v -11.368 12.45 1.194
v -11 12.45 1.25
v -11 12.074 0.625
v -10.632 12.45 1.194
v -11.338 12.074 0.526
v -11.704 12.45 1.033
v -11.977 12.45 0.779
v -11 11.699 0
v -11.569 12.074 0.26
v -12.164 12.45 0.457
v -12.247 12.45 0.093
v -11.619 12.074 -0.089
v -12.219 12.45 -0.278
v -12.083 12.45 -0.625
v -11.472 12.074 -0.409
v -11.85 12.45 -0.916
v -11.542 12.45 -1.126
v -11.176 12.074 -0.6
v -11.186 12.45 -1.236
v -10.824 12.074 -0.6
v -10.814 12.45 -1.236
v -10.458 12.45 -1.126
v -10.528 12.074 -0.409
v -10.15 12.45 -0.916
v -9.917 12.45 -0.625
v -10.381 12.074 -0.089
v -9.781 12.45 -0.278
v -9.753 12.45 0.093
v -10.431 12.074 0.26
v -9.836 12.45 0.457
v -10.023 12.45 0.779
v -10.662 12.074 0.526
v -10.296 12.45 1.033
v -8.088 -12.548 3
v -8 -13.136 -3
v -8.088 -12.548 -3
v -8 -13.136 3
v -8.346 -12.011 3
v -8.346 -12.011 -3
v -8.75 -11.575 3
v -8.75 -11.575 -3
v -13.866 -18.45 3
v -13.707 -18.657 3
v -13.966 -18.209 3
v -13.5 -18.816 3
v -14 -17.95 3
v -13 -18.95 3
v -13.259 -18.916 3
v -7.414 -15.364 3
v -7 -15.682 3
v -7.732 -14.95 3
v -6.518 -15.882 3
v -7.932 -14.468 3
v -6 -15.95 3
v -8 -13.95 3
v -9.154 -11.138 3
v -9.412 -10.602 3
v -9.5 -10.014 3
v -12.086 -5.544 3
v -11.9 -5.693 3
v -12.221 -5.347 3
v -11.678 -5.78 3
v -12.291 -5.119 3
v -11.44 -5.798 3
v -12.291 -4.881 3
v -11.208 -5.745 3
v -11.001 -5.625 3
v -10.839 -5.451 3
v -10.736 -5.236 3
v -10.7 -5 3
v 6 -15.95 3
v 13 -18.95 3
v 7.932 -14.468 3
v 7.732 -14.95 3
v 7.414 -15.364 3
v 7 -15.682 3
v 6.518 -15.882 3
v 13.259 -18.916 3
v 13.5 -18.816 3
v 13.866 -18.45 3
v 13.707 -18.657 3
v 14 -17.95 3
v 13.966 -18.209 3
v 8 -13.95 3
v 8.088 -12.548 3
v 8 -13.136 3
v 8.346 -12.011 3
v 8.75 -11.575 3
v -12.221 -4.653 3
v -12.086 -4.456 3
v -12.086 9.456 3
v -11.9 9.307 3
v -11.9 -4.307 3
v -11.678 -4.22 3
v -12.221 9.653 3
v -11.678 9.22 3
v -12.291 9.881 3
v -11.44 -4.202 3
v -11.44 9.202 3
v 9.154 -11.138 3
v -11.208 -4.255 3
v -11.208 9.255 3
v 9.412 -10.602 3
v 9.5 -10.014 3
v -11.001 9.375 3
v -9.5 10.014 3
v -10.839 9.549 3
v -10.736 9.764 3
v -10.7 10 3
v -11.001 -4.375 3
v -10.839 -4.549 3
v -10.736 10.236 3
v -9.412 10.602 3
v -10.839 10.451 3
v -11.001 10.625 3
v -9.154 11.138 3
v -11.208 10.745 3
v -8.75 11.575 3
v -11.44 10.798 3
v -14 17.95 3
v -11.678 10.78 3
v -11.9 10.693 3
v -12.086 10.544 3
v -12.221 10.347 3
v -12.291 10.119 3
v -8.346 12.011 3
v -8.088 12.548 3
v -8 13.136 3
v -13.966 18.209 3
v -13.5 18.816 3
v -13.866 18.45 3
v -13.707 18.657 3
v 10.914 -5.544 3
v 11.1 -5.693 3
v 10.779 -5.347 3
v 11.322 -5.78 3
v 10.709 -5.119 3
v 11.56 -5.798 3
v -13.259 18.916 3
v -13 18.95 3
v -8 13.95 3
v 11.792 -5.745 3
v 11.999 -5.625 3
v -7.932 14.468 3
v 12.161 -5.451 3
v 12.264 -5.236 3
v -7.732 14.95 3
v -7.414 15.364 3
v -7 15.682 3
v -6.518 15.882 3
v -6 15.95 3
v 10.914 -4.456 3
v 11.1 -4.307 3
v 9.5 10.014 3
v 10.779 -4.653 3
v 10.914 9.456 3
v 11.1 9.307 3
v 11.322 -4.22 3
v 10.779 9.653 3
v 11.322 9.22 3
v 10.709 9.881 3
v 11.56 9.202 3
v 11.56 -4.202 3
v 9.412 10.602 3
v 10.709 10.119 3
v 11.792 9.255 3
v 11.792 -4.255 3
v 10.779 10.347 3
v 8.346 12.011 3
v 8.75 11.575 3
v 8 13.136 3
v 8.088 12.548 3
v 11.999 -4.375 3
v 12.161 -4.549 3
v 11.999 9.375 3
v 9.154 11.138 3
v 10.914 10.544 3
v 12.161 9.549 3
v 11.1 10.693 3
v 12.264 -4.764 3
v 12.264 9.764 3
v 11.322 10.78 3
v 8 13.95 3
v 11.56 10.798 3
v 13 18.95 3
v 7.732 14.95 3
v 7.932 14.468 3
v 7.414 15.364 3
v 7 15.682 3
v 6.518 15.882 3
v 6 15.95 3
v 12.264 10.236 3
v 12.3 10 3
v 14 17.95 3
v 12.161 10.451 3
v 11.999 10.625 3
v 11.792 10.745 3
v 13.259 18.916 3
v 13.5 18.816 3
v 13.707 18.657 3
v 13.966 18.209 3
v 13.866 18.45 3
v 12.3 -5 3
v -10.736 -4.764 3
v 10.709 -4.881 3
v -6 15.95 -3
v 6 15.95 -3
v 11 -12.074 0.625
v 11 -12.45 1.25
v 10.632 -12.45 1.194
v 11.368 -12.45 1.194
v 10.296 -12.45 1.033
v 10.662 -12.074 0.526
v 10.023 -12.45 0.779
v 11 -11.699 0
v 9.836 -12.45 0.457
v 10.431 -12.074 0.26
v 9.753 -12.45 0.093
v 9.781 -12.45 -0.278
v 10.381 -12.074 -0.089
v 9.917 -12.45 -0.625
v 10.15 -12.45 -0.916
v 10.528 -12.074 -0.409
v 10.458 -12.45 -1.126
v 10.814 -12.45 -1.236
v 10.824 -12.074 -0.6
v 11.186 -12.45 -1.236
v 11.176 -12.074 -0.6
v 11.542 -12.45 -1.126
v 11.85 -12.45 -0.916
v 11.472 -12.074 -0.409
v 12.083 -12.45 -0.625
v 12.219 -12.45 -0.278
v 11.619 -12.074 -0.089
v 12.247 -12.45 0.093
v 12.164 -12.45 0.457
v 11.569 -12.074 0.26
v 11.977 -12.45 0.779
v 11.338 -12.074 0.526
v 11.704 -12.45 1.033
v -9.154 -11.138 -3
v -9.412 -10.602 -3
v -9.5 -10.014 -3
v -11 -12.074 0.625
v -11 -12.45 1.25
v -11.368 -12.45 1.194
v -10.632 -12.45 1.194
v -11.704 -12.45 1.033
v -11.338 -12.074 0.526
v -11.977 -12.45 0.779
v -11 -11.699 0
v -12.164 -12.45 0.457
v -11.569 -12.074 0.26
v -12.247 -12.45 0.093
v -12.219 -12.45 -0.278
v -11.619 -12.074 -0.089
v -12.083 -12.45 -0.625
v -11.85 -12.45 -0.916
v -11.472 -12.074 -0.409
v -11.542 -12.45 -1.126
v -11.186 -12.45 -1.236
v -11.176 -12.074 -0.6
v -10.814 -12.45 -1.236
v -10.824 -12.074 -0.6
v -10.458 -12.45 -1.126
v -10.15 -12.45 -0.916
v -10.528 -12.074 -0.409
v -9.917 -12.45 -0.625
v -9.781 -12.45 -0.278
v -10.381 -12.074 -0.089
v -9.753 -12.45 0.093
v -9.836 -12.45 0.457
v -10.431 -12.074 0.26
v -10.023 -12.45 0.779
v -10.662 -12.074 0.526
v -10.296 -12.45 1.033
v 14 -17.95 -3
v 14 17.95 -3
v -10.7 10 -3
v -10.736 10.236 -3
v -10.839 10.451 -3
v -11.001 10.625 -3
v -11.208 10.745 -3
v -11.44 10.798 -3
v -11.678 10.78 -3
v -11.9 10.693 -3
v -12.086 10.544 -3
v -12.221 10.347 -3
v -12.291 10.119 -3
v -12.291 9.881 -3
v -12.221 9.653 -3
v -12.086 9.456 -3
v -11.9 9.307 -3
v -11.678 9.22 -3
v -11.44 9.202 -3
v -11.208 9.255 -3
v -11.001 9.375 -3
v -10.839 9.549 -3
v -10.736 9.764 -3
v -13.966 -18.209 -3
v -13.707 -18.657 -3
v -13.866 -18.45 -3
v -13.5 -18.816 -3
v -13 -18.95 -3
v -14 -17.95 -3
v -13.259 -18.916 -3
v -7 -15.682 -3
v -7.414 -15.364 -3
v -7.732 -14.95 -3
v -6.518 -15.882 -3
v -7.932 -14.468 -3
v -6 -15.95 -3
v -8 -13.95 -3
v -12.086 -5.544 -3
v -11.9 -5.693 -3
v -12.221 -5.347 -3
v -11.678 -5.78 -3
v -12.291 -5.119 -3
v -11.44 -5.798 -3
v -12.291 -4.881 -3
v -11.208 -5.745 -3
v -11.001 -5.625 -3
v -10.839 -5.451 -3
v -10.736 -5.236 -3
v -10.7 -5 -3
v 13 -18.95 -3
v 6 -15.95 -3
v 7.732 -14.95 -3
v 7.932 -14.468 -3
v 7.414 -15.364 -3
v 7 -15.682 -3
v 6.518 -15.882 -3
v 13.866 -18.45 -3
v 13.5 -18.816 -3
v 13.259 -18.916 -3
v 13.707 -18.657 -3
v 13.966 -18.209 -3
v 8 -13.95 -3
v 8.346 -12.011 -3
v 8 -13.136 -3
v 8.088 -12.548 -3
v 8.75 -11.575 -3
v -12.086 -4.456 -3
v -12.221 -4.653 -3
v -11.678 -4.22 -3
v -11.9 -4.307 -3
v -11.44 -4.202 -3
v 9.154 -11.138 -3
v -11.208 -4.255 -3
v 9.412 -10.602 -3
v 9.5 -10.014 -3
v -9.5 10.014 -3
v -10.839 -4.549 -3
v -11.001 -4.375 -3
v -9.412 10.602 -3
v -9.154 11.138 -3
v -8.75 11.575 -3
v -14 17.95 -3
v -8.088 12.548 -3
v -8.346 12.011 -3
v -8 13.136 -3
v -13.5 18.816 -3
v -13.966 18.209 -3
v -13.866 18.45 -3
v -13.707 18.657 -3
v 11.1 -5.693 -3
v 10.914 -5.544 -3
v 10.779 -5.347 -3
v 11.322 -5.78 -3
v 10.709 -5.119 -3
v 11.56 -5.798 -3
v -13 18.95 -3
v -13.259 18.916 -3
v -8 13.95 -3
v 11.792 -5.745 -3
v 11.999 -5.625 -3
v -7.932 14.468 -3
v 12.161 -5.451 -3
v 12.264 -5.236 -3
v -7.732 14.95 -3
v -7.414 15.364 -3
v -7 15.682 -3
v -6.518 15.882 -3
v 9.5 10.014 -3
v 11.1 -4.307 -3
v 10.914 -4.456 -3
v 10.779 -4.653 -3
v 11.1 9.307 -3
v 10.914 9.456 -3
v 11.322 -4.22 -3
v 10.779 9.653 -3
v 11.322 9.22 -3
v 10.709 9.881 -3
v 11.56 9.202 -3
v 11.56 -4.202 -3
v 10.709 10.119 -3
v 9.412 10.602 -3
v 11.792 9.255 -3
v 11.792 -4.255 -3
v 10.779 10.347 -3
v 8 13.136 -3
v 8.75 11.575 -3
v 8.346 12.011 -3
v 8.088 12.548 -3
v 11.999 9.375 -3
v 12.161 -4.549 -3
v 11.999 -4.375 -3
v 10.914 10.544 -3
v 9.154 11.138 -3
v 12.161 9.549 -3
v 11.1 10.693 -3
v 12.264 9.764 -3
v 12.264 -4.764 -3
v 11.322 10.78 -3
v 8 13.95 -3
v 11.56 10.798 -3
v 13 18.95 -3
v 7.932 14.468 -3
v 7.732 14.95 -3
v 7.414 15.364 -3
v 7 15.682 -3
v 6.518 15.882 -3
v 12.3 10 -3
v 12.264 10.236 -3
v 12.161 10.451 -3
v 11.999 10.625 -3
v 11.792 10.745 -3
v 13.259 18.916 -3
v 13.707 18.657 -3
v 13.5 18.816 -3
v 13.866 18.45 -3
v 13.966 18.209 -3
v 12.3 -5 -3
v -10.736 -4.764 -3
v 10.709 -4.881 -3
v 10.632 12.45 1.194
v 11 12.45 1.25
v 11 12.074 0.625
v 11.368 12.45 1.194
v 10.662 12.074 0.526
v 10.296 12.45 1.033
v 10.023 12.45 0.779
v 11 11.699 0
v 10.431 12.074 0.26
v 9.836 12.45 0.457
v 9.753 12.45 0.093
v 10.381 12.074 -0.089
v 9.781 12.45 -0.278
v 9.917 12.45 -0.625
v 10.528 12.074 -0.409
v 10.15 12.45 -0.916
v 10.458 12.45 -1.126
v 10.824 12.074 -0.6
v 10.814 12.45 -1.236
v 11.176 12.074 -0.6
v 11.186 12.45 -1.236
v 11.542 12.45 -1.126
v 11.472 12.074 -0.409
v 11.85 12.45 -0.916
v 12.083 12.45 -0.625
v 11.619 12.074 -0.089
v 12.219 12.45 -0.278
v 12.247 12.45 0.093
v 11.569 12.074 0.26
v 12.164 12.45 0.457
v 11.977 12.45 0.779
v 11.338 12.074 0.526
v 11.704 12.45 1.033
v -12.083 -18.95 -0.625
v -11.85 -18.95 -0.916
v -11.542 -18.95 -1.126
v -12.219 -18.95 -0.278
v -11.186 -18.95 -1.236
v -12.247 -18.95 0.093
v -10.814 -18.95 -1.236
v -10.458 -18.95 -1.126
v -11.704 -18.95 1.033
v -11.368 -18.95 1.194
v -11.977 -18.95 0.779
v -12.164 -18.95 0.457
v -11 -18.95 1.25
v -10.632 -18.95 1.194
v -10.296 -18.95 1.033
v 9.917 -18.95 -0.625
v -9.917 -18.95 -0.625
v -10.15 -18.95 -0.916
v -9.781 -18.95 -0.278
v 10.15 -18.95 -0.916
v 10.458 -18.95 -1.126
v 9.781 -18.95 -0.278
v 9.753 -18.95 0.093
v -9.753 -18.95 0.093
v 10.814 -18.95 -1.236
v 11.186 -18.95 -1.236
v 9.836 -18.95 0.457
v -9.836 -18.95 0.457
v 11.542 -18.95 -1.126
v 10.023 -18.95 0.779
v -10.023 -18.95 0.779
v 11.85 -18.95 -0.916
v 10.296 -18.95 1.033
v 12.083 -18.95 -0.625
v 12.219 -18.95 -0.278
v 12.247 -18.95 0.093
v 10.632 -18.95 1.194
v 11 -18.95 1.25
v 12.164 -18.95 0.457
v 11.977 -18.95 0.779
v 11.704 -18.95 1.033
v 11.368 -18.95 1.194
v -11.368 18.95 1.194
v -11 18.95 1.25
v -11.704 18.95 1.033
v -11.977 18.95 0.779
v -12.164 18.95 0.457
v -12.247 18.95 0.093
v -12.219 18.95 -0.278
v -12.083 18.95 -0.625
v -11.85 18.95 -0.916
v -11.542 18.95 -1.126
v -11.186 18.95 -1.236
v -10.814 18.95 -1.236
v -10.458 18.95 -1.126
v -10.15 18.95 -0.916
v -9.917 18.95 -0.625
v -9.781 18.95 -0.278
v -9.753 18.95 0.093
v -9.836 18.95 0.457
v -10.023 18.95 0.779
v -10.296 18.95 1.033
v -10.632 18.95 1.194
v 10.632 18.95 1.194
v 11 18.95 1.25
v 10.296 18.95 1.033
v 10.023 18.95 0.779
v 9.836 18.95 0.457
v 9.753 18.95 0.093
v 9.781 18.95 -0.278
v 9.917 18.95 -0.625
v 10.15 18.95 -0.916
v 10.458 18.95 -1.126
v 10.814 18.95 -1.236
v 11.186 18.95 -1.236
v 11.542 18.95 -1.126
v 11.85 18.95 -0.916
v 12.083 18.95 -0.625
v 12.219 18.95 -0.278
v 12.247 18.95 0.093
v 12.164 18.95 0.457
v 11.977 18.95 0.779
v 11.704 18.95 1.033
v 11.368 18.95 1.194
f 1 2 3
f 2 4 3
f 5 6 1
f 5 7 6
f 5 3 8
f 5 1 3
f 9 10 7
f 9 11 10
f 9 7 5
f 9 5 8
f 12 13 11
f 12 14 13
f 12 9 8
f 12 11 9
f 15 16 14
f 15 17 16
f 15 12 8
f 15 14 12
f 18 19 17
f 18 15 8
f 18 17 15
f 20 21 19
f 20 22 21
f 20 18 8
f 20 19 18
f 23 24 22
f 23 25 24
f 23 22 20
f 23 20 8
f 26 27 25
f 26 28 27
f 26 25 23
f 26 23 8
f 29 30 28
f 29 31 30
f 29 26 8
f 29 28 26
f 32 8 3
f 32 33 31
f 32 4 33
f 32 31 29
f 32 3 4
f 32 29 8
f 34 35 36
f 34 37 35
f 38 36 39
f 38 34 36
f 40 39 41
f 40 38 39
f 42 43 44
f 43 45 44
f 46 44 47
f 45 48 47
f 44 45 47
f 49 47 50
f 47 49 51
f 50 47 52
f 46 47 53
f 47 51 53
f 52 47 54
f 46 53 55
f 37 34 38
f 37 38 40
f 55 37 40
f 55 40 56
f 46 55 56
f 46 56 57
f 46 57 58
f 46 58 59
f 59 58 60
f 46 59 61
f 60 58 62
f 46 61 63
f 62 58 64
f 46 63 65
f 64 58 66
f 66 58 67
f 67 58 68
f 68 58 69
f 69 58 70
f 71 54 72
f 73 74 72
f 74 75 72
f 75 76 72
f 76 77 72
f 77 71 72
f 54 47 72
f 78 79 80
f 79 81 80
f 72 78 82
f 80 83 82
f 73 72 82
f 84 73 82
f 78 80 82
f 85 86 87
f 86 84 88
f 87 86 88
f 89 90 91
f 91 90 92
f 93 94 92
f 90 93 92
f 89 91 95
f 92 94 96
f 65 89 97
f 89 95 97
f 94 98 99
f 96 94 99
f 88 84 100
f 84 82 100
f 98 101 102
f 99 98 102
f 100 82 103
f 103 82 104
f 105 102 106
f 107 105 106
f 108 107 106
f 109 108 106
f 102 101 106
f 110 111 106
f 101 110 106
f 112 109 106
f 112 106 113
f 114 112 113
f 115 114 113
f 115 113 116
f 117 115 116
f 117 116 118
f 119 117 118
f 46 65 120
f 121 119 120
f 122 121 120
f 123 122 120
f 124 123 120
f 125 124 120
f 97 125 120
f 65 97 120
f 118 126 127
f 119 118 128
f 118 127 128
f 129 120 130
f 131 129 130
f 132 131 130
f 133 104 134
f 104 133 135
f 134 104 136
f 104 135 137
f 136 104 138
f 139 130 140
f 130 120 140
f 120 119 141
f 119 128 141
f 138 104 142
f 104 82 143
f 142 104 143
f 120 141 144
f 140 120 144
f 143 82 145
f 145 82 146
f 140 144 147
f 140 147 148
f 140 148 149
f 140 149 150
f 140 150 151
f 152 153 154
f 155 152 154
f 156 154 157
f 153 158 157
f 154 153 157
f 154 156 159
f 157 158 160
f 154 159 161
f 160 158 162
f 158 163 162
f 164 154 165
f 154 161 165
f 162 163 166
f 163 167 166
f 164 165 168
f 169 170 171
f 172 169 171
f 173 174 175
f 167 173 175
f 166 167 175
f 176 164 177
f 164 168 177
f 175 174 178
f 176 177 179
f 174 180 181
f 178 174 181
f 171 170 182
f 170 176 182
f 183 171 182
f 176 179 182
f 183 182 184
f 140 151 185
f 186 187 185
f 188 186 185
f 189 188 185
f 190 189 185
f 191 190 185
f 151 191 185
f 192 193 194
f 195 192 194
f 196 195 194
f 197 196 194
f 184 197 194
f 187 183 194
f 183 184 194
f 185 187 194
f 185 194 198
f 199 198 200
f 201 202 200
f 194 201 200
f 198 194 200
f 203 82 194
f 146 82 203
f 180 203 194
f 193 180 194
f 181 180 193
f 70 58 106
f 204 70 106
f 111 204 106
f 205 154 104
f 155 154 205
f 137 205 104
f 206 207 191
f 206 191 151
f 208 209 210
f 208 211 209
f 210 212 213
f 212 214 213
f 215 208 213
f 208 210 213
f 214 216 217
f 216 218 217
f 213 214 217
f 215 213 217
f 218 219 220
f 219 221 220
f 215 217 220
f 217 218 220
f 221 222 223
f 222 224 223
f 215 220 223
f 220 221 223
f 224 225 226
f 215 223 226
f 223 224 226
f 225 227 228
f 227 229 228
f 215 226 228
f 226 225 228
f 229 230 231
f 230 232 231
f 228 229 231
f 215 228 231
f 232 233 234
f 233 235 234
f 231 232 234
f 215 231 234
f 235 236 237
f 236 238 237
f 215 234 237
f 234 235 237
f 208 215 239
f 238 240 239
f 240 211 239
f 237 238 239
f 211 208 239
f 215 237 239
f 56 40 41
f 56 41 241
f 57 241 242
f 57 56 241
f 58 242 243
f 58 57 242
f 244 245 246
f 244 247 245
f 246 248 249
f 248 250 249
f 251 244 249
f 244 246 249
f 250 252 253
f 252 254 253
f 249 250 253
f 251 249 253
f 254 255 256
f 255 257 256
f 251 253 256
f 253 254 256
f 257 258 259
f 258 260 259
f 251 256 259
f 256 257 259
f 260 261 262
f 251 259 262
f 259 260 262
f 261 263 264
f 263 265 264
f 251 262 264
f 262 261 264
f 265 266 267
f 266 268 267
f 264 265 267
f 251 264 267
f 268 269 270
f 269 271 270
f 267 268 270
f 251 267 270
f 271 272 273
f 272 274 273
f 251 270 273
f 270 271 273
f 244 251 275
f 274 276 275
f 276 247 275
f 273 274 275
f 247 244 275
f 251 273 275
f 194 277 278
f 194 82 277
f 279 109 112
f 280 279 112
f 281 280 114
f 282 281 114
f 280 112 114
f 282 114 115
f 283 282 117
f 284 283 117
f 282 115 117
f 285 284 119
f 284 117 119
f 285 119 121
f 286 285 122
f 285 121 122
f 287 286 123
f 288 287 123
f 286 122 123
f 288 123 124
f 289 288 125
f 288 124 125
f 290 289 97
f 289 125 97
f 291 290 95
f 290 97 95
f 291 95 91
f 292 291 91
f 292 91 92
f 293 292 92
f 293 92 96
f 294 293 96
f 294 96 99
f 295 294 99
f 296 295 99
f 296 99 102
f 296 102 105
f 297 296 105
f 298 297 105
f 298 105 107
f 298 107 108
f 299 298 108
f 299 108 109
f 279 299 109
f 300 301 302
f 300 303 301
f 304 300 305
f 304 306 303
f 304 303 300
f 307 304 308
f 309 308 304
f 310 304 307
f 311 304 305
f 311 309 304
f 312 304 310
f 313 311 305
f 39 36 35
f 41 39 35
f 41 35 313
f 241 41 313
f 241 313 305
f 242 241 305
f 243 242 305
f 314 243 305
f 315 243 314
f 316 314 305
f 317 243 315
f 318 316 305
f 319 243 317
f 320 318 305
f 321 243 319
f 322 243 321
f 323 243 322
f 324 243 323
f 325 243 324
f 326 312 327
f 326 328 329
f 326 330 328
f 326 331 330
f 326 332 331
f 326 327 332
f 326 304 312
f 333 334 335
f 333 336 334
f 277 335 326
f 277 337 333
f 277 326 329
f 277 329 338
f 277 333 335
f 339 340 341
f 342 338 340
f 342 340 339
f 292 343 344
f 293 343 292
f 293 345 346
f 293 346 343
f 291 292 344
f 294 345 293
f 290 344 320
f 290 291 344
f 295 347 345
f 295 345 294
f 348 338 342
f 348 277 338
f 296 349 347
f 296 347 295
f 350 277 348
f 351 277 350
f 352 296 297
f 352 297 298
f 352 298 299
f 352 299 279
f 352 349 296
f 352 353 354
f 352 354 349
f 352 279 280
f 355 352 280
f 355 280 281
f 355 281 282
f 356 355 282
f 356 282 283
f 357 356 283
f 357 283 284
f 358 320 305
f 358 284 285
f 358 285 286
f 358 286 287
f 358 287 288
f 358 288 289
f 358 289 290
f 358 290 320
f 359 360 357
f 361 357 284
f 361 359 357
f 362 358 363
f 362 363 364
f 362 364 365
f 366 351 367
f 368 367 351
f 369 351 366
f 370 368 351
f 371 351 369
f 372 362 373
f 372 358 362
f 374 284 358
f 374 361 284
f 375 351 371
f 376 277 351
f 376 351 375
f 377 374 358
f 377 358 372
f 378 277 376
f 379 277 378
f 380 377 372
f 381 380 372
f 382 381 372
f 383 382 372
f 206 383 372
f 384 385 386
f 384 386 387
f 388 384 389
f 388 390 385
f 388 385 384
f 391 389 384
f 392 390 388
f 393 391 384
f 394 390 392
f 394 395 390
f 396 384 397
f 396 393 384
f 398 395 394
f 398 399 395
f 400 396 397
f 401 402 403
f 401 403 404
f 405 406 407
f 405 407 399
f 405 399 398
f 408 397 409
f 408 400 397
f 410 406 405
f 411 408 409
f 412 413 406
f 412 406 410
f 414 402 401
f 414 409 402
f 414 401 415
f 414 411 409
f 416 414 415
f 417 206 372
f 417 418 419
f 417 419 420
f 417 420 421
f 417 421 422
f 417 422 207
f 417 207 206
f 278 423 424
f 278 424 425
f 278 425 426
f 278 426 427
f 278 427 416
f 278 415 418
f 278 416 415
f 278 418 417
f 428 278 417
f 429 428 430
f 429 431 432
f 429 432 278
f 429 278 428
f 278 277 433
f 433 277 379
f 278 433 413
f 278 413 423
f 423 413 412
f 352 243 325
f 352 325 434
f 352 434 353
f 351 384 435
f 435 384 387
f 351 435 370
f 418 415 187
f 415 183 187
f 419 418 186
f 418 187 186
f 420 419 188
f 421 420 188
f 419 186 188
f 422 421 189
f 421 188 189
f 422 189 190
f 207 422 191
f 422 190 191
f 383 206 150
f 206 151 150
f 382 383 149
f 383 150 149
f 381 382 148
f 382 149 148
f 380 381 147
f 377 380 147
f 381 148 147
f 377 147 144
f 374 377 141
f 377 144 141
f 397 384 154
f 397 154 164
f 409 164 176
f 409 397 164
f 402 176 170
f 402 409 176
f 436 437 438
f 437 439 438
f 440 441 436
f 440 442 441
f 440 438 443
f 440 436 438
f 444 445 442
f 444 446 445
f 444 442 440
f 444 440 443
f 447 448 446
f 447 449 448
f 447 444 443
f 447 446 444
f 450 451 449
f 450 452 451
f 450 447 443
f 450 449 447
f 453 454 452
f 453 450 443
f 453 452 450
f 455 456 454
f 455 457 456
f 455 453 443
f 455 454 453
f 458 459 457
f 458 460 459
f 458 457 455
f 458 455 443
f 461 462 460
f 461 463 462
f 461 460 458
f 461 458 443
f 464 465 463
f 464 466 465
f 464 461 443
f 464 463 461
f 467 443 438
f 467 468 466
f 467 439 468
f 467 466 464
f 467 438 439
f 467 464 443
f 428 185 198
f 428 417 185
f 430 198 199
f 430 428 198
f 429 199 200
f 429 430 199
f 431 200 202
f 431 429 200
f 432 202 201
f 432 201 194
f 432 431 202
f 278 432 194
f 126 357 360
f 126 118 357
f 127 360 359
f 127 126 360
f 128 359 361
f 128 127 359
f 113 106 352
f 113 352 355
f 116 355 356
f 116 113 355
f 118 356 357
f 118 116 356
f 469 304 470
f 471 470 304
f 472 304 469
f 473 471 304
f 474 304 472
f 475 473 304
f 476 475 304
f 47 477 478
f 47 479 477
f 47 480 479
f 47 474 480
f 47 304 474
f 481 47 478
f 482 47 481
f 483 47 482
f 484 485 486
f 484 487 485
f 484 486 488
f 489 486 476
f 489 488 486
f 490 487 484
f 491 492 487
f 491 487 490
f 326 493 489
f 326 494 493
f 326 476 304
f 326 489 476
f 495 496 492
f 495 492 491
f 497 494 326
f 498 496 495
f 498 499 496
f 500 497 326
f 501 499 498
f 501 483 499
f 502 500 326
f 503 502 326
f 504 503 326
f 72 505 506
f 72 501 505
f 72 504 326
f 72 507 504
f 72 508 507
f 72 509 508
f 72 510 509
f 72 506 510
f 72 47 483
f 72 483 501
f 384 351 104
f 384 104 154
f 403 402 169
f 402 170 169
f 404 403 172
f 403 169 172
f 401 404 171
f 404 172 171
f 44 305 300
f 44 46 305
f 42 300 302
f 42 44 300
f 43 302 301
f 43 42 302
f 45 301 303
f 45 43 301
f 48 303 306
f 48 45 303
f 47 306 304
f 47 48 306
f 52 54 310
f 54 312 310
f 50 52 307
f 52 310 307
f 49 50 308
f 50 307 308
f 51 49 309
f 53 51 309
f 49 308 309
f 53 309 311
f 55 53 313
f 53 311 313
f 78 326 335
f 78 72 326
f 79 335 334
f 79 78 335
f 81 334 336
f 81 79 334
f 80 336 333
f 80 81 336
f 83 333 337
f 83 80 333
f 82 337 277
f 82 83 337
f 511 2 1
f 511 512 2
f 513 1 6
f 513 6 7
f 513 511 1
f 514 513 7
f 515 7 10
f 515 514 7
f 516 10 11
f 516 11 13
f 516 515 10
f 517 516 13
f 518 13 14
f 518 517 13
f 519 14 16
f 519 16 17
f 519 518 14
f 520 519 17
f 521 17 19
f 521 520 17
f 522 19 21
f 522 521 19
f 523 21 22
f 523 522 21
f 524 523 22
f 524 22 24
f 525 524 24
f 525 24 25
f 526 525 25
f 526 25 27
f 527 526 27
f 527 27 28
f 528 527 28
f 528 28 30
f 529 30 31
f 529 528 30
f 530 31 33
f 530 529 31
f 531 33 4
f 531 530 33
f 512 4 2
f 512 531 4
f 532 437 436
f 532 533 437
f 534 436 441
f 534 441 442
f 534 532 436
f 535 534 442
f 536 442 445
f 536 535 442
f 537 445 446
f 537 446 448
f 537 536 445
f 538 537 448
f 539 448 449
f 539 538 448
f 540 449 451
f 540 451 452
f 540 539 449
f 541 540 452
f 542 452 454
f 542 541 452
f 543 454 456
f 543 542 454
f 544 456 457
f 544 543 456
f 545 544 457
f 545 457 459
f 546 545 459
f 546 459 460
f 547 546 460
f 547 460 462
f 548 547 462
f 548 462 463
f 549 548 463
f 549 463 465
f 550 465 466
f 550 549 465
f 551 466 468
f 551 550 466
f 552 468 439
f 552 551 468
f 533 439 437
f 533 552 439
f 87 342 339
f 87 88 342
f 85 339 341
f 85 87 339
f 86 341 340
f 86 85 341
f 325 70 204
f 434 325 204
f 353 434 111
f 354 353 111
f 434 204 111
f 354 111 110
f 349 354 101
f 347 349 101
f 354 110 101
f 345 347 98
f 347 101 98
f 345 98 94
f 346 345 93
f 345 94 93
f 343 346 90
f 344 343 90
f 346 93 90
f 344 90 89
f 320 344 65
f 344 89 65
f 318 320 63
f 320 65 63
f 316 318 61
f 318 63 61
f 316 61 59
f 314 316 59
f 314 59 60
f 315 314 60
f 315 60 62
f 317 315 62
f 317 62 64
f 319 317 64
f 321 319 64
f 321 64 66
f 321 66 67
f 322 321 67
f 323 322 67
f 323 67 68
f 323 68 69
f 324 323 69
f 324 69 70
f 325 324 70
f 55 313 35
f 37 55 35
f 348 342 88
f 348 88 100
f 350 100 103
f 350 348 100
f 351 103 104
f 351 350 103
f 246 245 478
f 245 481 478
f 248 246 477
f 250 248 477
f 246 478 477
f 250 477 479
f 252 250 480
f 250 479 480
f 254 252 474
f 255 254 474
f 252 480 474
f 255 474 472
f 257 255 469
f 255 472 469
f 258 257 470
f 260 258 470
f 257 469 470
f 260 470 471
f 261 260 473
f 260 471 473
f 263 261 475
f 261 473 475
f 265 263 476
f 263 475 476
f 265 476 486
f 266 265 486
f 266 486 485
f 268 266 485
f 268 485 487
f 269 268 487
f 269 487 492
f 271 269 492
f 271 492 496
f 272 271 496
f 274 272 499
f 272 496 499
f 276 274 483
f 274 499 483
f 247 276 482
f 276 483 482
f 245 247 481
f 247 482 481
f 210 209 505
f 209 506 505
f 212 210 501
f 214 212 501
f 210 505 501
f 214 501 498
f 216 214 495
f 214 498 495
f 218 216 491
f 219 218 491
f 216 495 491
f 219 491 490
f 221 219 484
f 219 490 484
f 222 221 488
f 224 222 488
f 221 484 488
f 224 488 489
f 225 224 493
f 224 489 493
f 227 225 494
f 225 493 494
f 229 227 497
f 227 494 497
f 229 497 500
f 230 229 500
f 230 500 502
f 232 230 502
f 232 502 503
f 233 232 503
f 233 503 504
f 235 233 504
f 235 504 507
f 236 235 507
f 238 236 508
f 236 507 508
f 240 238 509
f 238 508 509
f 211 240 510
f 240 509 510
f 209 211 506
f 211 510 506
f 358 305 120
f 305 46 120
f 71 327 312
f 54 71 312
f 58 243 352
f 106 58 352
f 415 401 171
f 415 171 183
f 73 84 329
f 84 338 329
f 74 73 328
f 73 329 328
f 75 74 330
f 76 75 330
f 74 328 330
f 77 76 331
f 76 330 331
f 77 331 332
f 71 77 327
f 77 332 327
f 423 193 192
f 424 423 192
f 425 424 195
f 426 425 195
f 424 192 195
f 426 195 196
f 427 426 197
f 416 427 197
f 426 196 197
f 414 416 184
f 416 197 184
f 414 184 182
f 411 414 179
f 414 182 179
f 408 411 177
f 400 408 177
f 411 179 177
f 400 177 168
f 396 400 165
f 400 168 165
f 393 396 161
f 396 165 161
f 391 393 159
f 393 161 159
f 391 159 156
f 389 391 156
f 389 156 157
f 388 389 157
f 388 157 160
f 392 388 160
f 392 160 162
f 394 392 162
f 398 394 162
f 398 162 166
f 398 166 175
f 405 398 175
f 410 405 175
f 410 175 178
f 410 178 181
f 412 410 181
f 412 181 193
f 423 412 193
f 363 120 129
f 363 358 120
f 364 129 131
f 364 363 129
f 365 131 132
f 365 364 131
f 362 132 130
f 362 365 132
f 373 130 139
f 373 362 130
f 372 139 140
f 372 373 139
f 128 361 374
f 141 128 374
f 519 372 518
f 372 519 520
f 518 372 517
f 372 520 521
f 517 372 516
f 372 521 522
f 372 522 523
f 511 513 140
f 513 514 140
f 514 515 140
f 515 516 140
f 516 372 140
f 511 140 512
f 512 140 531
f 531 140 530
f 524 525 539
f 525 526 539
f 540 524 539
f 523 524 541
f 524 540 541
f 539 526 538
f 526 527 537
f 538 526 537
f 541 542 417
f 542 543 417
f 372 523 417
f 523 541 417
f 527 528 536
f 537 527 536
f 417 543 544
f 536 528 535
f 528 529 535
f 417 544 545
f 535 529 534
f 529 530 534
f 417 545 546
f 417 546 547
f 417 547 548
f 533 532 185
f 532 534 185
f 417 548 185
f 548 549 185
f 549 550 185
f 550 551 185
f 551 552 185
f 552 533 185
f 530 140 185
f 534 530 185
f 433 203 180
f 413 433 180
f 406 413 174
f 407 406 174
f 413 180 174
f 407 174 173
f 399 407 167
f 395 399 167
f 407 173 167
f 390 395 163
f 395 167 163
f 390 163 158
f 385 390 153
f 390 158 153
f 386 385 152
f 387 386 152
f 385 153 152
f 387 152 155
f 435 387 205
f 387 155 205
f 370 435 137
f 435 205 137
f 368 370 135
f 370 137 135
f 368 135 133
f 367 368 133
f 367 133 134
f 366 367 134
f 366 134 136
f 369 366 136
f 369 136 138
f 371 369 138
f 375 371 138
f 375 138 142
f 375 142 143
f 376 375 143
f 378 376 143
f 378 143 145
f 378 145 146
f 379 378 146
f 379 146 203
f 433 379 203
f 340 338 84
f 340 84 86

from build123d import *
from OCP.BRepFilletAPI import BRepFilletAPI_MakeFillet

# Parameters (mm, degrees)
SKETCH_1_W                  = 28
SKETCH_1_H                  = 37.9
EXTRUDE_1_DEPTH             = 3
HOLE_WIZARD_M3_1_AT_2_COUNT = 2
HOLE_WIZARD_M3_1_AT_2_PITCH = 22
HOLE_WIZARD_M2_1_D          = 1.6
SKETCH_8_W                  = 16
SKETCH_8_H                  = 31.9
CUT_EXTRUDE_1_DEPTH         = 18
SKETCH_9_W                  = 19
SKETCH_9_H                  = 23.9
CUT_EXTRUDE_2_DEPTH         = 18
FILLET_1_R                  = 2
FILLET_2_R1                 = 2
FILLET_2_R2                 = 1


with BuildPart() as part:
    # 草图1 → 凸台-拉伸1 (new, symmetric)
    with BuildSketch(Plane.XY):
        Rectangle(SKETCH_1_W, SKETCH_1_H)
    extrude(amount=EXTRUDE_1_DEPTH, both=True)

    # 草图4 → M3 螺纹孔1 (revolve, cut)
    with BuildSketch(Plane(origin=(-11, 18.95, 0), x_dir=(0, 0, 1), z_dir=(1, 0, 0))):
        Polygon((0, 0), (0, 7.251075774), (1.25, 6.5), (1.25, 0), align=None)
    hole_wizard_m3_1 = revolve(axis=Axis((-11, 25.3, 0), (0, -1, 0)), mode=Mode.SUBTRACT)

    # M3 螺纹孔1 at 2: M3 螺纹孔1 ×2
    with Locations(*[(i * HOLE_WIZARD_M3_1_AT_2_PITCH, 0, 0) for i in range(1, HOLE_WIZARD_M3_1_AT_2_COUNT)]):
        add(hole_wizard_m3_1, mode=Mode.SUBTRACT)

    # 镜向1: M3 螺纹孔1 across plane
    add(hole_wizard_m3_1.mirror(Plane.ZX), mode=Mode.SUBTRACT)

    # 镜向1 copy 1 sketch → 镜向1 copy 1 (revolve, cut)
    with BuildSketch(Plane(origin=(11, -18.95, 0), x_dir=(0, 0, 1), z_dir=(1, 0, 0))):
        Polygon((0, 0), (0, -7.251075774), (1.25, -6.5), (1.25, 0), align=None)
    revolve(axis=Axis((11, -25.3, 0), (0, -1, 0)), mode=Mode.SUBTRACT)

    # M2 螺纹孔1 (through all)
    with Locations(Plane(origin=(0, 0, -3), x_dir=(-1, 0, 0), z_dir=(0, 0, -1))):
        with Locations((-11.5, 10), (11.5, 10), (11.5, -5), (-11.5, -5)):
            Hole(HOLE_WIZARD_M2_1_D / 2)

    # 草图8 → 切除-拉伸1 (cut, symmetric)
    with BuildSketch(Plane(origin=(0, 0, -3), x_dir=(-1, 0, 0), z_dir=(0, 0, -1))):
        Rectangle(SKETCH_8_W, SKETCH_8_H)
    extrude(amount=CUT_EXTRUDE_1_DEPTH, both=True, mode=Mode.SUBTRACT)

    # 草图9 → 切除-拉伸2 (cut, symmetric)
    with BuildSketch(Plane(origin=(0, 0, -3), x_dir=(-1, 0, 0), z_dir=(0, 0, -1))):
        Rectangle(SKETCH_9_W, SKETCH_9_H)
    extrude(amount=CUT_EXTRUDE_2_DEPTH, both=True, mode=Mode.SUBTRACT)

    # 圆角1
    # the kernel refuses this fillet: 2 mm, written as the material it adds along each edge
    with BuildSketch(Plane(origin=(-9.5, 11.95, 3), x_dir=(1, 0, 0), z_dir=(0, 0, -1))) as fillet_1_piece_1:
        with BuildLine():
            CenterArc((2, 1.936491673), FILLET_1_R, 180, 75.522487814)
            Line((0, 1.936491673), (-0.04, 1.936491673))
            Line((-0.04, 1.936491673), (-0.04, 0))
            Line((-0.04, 0), (0, -0.04))
            ThreePointArc((0, -0.04), (0.75, -0.04), (1.49, -0.038729833))
            Line((1.49, -0.038729833), (1.5, 0))
        make_face()
    extrude(amount=6)
    with BuildSketch(Plane(origin=(-9.5, -11.95, 3), x_dir=(0, 1, 0), z_dir=(0, 0, -1))) as fillet_1_piece_2:
        with BuildLine():
            CenterArc((1.936491673, 2), FILLET_1_R, 194.477512186, 75.522487814)
            Line((0, 1.5), (-0.038729833, 1.49))
            ThreePointArc((-0.038729833, 1.49), (-0.04, 0.75), (-0.04, 0))
            Line((-0.04, 0), (0, -0.04))
            Line((0, -0.04), (1.936491673, -0.04))
            Line((1.936491673, -0.04), (1.936491673, 0))
        make_face()
    extrude(amount=6)
    with BuildSketch(Plane(origin=(9.5, -11.95, -3), x_dir=(-1, 0, 0), z_dir=(0, 0, 1))) as fillet_1_piece_3:
        with BuildLine():
            CenterArc((2, -1.936491673), FILLET_1_R, 104.477512186, 75.522487814)
            Line((0, -1.936491673), (-0.04, -1.936491673))
            Line((-0.04, -1.936491673), (-0.04, 0))
            Line((-0.04, 0), (0, 0.04))
            ThreePointArc((0, 0.04), (0.75, 0.04), (1.49, 0.038729833))
            Line((1.49, 0.038729833), (1.5, 0))
        make_face()
    extrude(amount=6)
    with BuildSketch(Plane(origin=(9.5, 11.95, -3), x_dir=(0, -1, 0), z_dir=(0, 0, 1))) as fillet_1_piece_4:
        with BuildLine():
            CenterArc((1.936491673, -2), FILLET_1_R, 90, 75.522487814)
            Line((0, -1.5), (-0.038729833, -1.49))
            ThreePointArc((-0.038729833, -1.49), (-0.04, -0.75), (-0.04, 0))
            Line((-0.04, 0), (0, 0.04))
            Line((0, 0.04), (1.936491673, 0.04))
            Line((1.936491673, 0.04), (1.936491673, 0))
        make_face()
    extrude(amount=6)

    # 圆角2: one fillet with a radius per group of edges: ONE call of the kernel's fillet builder (fillet() takes one radius for all edges)
    fillet_2_edges_1 = [part.edges().sort_by_distance(p)[0] for p in [
        (8, 11.95, 0),
        (8, 15.95, 0),
        (-8, -11.95, 0),
        (-8, 11.95, 0),
        (-8, 15.95, 0),
        (8, -11.95, 0),
        (8, -15.95, 0),
        (-8, -15.95, 0),
    ]]
    fillet_2_edges_2 = [part.edges().sort_by_distance(p)[0] for p in [
        (14, 18.95, 0),
        (-14, 18.95, 0),
        (-14, -18.95, 0),
        (14, -18.95, 0),
    ]]
    fillet_2 = BRepFilletAPI_MakeFillet(part.part.solid().wrapped)
    for e in fillet_2_edges_1:
        fillet_2.Add(FILLET_2_R1, e.wrapped)
    for e in fillet_2_edges_2:
        fillet_2.Add(FILLET_2_R2, e.wrapped)
    add(Compound.cast(fillet_2.Shape()), mode=Mode.REPLACE)


solid = part.part
